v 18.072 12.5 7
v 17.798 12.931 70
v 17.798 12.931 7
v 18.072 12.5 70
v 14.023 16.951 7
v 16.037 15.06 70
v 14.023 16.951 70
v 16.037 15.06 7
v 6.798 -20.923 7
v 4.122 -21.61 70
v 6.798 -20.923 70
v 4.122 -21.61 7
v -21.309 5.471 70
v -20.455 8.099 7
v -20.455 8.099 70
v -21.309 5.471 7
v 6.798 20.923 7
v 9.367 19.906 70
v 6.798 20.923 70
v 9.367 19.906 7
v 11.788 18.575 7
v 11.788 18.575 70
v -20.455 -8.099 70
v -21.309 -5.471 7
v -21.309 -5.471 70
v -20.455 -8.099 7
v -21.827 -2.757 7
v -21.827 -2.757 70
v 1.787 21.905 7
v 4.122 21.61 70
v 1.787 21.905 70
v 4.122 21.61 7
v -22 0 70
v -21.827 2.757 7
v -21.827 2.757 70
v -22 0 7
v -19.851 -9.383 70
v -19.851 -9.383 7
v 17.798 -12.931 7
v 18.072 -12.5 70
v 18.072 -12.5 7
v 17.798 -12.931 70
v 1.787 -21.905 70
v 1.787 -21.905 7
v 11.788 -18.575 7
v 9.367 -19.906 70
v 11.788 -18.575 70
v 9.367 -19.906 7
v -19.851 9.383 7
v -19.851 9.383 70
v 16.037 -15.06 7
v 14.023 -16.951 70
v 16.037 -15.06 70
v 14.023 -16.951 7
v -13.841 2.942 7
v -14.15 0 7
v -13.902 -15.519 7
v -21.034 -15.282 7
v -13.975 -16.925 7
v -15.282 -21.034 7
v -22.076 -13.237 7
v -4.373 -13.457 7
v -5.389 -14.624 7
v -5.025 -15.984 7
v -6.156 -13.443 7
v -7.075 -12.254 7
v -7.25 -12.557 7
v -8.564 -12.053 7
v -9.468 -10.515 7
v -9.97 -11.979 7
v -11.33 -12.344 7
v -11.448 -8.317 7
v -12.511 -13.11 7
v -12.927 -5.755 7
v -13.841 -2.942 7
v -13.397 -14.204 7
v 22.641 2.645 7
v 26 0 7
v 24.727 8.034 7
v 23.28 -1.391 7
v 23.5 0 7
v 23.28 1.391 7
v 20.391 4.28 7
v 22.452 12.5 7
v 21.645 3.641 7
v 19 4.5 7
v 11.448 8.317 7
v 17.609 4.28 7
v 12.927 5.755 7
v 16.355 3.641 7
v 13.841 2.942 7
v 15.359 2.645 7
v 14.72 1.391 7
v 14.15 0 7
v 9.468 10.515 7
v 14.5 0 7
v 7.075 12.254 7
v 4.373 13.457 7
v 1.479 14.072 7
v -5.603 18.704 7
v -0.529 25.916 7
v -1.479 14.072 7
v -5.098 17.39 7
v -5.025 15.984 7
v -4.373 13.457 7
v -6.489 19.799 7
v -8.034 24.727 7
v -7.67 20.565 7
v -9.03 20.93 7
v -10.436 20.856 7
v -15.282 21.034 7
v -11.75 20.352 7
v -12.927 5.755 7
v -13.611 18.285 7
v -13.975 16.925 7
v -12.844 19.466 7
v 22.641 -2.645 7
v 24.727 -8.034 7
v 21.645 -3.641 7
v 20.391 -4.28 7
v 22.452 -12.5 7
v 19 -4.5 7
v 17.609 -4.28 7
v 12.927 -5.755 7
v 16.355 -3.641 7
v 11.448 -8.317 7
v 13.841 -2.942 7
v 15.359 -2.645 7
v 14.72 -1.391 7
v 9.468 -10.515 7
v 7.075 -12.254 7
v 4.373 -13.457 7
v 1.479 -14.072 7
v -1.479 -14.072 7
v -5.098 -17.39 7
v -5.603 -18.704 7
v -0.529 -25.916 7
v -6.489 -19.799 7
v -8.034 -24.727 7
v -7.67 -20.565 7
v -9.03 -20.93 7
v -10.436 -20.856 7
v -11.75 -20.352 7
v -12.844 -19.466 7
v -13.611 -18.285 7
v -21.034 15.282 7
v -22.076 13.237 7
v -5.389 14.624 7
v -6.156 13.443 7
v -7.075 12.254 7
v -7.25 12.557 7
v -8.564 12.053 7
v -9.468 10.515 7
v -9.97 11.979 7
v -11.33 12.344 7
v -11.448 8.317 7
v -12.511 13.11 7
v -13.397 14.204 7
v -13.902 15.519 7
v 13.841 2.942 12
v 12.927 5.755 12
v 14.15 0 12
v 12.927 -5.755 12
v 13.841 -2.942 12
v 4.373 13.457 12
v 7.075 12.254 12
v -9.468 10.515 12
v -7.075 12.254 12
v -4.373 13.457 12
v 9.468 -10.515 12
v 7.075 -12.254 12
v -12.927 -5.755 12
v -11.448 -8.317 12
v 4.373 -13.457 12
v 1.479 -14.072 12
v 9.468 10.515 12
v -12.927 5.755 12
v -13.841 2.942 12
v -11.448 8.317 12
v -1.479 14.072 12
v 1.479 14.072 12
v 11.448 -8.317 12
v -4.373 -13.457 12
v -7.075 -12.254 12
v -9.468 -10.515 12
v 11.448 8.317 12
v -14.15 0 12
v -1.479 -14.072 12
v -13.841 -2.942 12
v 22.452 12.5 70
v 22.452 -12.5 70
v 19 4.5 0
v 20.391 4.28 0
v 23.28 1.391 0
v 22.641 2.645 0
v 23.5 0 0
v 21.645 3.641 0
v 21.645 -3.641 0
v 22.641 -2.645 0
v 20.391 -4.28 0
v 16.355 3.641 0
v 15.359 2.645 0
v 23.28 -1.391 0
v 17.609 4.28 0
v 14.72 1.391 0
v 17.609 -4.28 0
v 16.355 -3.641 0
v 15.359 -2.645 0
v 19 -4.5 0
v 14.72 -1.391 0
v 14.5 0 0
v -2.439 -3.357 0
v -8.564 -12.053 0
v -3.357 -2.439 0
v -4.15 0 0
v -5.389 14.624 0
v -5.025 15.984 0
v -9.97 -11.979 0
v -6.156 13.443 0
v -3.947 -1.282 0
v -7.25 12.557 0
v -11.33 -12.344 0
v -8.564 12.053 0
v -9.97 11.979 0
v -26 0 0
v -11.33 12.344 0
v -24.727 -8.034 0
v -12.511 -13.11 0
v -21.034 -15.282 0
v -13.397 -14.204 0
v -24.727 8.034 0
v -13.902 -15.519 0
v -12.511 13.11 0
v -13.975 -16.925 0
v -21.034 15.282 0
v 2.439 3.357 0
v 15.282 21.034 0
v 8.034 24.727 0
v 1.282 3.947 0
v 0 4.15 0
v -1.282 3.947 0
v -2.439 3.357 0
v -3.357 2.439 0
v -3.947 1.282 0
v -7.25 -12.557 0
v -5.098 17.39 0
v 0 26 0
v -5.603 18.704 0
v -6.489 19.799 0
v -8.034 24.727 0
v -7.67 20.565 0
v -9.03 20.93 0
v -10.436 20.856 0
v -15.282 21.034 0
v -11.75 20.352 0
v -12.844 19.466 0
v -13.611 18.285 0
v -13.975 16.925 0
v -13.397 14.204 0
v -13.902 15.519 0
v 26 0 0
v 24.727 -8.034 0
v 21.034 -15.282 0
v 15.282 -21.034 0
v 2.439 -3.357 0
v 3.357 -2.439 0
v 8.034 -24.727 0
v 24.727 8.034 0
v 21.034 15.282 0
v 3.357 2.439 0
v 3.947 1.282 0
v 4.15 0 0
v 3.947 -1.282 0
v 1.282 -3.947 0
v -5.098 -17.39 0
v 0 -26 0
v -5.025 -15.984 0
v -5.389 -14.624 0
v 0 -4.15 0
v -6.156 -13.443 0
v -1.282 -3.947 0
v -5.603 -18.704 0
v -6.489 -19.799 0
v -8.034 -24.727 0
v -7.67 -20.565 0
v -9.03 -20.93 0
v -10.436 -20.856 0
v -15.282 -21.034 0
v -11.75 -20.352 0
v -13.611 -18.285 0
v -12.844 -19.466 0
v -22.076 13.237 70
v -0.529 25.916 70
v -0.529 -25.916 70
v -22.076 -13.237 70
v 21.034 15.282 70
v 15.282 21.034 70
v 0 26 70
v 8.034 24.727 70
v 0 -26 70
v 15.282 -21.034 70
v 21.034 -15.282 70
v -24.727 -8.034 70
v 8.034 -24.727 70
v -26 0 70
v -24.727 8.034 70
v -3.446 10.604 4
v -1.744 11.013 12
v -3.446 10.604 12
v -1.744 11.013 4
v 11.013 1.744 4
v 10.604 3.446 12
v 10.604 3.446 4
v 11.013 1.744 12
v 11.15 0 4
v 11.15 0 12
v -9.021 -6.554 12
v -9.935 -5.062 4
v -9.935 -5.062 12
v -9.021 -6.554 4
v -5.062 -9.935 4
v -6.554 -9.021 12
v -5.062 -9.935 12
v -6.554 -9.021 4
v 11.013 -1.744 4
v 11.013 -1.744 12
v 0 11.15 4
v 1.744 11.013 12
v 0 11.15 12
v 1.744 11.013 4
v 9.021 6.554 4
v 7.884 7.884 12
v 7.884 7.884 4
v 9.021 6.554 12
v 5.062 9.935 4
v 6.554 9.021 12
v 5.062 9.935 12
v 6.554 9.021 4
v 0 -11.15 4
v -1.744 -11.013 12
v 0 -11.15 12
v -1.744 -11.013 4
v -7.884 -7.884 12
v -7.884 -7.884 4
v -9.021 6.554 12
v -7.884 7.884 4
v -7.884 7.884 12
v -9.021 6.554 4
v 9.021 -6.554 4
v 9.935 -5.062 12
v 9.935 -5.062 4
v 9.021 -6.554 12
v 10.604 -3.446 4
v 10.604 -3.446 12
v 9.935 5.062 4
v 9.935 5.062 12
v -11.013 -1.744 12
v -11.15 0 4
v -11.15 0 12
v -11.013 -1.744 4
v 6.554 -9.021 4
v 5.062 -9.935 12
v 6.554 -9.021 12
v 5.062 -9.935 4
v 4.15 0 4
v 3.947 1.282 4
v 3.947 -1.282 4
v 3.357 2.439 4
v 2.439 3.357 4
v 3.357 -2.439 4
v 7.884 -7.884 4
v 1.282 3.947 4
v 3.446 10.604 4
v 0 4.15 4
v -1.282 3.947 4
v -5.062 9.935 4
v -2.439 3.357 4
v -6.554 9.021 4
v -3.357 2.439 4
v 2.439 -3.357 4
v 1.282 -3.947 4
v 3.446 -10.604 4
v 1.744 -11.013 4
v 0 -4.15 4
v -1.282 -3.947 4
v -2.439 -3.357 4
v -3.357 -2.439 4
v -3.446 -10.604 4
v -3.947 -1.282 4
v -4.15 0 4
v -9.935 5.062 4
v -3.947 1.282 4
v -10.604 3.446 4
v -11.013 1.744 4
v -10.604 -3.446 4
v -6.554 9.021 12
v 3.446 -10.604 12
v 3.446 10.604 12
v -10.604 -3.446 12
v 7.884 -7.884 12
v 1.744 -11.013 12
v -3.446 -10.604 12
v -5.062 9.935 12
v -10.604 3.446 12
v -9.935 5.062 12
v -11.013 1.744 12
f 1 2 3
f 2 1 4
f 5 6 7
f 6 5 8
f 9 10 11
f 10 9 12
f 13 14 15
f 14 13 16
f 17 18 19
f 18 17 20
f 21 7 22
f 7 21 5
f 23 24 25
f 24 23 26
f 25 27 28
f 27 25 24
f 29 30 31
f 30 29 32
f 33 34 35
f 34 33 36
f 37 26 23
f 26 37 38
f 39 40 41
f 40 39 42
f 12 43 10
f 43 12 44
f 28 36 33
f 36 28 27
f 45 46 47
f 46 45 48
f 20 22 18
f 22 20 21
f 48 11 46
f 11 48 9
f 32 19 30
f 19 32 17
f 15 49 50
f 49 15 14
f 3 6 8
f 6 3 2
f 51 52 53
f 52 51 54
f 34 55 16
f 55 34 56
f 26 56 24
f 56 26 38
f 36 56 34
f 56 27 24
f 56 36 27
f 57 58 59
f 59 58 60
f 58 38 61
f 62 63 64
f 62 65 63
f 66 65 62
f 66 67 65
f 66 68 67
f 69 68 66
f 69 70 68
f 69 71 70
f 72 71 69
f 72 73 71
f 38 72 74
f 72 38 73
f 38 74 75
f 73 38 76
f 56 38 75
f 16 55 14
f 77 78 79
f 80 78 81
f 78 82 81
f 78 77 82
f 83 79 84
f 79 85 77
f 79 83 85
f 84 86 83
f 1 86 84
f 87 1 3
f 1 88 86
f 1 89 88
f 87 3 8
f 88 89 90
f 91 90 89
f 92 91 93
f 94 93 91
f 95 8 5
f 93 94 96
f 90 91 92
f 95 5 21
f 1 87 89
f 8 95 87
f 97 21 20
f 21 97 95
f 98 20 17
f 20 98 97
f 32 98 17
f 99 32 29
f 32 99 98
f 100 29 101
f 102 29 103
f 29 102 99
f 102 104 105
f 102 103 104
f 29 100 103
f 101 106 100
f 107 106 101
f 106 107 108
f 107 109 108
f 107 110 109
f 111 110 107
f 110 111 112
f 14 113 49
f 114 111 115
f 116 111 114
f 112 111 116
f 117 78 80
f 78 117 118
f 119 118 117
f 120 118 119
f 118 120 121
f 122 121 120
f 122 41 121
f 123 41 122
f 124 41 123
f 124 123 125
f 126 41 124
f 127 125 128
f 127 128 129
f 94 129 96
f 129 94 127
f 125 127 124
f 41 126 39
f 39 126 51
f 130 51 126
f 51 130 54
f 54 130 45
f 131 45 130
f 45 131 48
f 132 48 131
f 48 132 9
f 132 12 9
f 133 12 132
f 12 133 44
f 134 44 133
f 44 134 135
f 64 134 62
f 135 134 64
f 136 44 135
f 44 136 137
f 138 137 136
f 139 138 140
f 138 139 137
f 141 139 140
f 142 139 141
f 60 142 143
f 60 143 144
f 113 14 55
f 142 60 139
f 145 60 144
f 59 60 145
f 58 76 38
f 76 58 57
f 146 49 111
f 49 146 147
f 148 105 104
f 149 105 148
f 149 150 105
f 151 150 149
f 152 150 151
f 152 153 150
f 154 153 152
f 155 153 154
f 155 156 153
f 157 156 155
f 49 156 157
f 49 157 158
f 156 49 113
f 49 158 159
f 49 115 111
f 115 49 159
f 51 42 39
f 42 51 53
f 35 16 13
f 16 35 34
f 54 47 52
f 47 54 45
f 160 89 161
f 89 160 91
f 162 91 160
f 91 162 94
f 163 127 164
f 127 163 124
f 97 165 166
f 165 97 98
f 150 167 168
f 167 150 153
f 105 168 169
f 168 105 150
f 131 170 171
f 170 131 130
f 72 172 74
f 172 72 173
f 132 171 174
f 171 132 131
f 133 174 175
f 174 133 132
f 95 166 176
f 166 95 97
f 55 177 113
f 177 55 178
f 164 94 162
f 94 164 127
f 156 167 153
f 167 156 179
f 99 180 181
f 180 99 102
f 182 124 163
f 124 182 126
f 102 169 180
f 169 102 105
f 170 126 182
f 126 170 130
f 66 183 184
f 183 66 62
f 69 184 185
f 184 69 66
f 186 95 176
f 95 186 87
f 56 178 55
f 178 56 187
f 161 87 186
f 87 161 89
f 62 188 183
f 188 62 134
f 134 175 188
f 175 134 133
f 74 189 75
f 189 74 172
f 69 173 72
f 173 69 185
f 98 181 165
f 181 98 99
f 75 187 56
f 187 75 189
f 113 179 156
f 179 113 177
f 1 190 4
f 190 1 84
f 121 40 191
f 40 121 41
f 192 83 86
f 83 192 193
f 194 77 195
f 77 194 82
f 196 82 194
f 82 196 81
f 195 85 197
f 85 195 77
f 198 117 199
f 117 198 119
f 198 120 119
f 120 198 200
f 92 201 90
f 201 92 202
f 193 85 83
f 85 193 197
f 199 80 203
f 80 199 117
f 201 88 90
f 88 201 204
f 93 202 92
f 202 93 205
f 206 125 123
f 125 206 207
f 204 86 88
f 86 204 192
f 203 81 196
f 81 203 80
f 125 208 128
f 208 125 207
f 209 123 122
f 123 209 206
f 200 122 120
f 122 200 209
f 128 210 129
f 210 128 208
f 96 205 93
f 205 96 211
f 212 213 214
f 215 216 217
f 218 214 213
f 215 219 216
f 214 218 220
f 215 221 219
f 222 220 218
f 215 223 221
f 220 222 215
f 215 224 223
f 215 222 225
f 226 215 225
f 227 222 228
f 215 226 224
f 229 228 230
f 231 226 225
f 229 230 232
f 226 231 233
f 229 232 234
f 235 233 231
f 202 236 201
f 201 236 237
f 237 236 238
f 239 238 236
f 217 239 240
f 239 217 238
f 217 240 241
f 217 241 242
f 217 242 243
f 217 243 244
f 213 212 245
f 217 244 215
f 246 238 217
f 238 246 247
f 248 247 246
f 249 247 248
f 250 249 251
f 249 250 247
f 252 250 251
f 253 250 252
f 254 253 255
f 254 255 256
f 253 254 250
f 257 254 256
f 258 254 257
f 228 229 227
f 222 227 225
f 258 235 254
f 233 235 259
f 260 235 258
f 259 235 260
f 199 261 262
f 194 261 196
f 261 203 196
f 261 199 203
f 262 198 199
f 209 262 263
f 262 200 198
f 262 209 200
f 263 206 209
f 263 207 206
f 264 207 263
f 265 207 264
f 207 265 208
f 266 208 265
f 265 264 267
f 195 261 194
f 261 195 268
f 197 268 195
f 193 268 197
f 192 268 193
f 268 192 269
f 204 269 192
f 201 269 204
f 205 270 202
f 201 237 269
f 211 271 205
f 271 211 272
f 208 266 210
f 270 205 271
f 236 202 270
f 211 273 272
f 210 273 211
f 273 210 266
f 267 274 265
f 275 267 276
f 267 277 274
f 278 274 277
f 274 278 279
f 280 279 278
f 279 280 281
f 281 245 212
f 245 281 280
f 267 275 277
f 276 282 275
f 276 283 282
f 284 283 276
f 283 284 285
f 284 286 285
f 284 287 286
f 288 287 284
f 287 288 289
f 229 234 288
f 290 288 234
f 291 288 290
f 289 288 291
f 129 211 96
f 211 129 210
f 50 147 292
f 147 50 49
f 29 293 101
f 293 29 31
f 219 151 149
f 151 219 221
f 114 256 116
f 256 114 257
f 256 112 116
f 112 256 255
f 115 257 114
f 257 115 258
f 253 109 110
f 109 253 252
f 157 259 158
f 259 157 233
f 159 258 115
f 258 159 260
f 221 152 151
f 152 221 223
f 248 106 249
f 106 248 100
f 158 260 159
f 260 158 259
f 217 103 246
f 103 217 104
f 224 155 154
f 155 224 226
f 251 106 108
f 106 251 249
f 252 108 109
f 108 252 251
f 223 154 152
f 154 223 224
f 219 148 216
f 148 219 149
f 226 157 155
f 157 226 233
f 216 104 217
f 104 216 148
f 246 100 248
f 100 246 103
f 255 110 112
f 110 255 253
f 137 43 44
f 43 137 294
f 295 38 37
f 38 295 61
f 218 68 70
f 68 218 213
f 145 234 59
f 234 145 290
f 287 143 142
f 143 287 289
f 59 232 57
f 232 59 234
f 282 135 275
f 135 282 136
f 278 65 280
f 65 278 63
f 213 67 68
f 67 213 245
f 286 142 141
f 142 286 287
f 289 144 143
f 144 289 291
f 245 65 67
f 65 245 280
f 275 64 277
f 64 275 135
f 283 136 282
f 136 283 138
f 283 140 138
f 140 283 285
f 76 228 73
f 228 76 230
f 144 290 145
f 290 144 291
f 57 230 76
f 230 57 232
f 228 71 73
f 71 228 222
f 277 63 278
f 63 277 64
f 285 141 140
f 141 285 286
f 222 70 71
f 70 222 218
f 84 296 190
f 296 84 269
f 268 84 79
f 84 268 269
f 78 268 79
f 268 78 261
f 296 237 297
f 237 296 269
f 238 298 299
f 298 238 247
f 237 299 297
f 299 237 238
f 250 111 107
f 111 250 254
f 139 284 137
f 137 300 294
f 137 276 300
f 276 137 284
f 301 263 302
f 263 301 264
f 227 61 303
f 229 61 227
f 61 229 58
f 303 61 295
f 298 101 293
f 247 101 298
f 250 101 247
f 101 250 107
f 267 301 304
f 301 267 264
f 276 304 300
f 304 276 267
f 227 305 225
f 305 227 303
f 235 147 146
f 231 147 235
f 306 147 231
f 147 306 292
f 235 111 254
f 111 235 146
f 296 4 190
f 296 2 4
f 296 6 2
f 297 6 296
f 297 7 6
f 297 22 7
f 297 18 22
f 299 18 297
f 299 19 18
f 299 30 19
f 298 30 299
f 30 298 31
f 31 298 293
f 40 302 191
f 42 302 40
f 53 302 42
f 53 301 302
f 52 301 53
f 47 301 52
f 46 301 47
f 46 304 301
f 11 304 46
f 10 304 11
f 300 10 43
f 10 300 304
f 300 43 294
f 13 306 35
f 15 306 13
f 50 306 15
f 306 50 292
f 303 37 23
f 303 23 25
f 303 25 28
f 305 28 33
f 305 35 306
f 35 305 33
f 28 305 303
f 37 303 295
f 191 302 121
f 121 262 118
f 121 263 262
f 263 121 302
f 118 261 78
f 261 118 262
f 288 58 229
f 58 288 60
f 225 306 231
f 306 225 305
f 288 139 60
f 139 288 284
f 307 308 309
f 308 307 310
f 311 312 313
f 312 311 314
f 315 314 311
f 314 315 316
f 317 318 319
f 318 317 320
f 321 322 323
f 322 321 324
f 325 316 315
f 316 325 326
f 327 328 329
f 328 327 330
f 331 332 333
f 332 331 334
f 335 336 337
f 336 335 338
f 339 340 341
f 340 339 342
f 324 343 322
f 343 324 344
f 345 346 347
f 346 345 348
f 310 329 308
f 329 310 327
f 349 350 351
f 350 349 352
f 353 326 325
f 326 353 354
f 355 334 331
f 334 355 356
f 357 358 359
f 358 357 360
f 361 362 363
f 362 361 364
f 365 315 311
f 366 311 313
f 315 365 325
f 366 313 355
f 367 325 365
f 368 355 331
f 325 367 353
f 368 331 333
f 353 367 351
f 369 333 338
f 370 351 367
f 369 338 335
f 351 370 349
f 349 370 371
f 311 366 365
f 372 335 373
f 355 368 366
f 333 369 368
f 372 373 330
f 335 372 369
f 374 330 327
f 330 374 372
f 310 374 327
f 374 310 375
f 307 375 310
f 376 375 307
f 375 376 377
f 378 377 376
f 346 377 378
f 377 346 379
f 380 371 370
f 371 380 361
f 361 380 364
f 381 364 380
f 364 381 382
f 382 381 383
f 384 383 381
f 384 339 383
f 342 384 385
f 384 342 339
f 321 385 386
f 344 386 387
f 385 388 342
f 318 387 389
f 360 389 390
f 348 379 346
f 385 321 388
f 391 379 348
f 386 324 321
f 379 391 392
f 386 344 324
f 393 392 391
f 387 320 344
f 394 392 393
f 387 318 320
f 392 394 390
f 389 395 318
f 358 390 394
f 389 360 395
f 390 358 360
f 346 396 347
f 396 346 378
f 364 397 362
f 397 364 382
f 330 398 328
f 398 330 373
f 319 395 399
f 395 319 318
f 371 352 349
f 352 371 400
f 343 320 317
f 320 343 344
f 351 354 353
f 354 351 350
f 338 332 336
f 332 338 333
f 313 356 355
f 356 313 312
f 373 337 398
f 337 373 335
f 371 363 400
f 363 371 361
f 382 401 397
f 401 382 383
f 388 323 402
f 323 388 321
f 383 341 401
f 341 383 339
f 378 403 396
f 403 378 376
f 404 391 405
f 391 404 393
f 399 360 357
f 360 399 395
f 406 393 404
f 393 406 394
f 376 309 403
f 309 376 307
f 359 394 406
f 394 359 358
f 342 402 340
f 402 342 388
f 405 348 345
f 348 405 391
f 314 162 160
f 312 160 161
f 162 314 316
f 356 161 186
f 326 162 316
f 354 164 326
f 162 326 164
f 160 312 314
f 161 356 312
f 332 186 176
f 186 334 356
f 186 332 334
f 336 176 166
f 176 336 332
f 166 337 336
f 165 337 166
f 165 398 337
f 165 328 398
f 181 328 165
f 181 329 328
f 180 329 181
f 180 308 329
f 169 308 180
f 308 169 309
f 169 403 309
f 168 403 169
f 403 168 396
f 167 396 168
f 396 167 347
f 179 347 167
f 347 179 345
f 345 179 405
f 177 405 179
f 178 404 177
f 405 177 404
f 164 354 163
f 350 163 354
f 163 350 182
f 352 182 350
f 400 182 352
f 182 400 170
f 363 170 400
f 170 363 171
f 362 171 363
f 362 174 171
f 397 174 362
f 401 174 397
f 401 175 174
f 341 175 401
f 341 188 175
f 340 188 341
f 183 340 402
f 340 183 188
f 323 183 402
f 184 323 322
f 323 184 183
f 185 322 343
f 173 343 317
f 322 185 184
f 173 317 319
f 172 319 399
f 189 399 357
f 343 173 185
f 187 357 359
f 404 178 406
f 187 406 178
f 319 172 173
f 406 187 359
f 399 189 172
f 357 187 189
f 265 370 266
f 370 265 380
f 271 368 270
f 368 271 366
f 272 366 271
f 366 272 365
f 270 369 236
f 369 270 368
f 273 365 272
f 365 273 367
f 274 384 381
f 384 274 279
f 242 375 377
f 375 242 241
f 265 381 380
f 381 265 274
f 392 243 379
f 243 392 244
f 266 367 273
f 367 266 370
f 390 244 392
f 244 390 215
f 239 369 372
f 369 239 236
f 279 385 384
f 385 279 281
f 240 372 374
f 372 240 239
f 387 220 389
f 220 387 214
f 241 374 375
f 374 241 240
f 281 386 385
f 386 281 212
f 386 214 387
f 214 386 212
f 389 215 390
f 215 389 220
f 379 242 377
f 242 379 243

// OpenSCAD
// file: dronePlates.scad
/**
 * dronePlates.scad
 * Plate library
 *
 * GNU GPL V3
 * @author: Victor Potenciano
 */

m3Rad = 3.4/2;
cornerR = 4;

/**
 *
 */
module helperDisk(diameter) {
	cylinder(r = diameter/2, h = 0.6, $fn=20);
}

/**
 *
 */
module roundedRect(size, radius) {
	x = size[0];
	y = size[1];
	z = size[2];

	linear_extrude(height=z)
	hull() {
	// place 4 circles in the corners, with the given radius
	translate([(-x/2)+(radius/2), (-y/2)+(radius/2), 0]){ circle(r=radius); }
	translate([(x/2)-(radius/2), (-y/2)+(radius/2), 0]){ circle(r=radius); }
	translate([(-x/2)+(radius/2), (y/2)-(radius/2), 0]){ circle(r=radius); }
	translate([(x/2)-(radius/2), (y/2)-(radius/2), 0]){ circle(r=radius); }
	}
}

/**
 * rounded rectangle triangle with corner at origin
 */
module roundedTriangle(size, radius) {
	x = size[0];
	y = size[1];
	z = size[2];

	linear_extrude(height=z)
	hull() {
	translate([radius, radius, 0]){ circle(r=radius); }
	translate([x-radius, radius, 0]){ circle(r=radius); }
	translate([radius, y-radius, 0]){ circle(r=radius); }
	}
}

/**
 *
 */
module roundRectPlate(w, l, plateThick=3) {
	difference(){
		roundedRect([l+m3Rad*1.75,w+m3Rad*1.75,plateThick], cornerR);
		translate([l/2, w/2, -0.5]) { cylinder(h = plateThick+1, r = m3Rad, $fn=30); }
		translate([-l/2, w/2, -0.5]) { cylinder(h = plateThick+1, r = m3Rad, $fn=30); }
		translate([l/2, -w/2, -0.5]) { cylinder(h = plateThick+1, r = m3Rad, $fn=30); }
		translate([-l/2, -w/2, -0.5]) { cylinder(h = plateThick+1, r = m3Rad, $fn=30); }
	}
}

/**
 *
 */
module crossSquarePlate(l, thick=3) {
	inDist = cornerR*2+4;
	trianL = sqrt((l*l)/2)-inDist;
	centerR = 4;

	difference(){
		roundRectPlate(l, l, thick);
		translate([0, centerR, -0.5]) { 
			rotate([0,0,45]){ roundedTriangle([trianL,trianL,thick+1], cornerR-2); }
		}
		translate([0, -centerR, -0.5]) { 
			rotate([0,0,225]){ roundedTriangle([trianL,trianL,thick+1], cornerR-2); }
		}
		translate([-centerR, 0, -0.5]) { 
			rotate([0,0,135]){ roundedTriangle([trianL,trianL,thick+1], cornerR-2); }
		}
		translate([centerR, 0, -0.5]) { 
			rotate([0,0,-45]){ roundedTriangle([trianL,trianL,thick+1], cornerR-2); }
		}
	}
}

/**
 *
 */
module hShapePlate(w, l, thick=4) {
	inDist = cornerR*2+1;

	difference(){
		roundRectPlate(w, l, thick);
		translate([0, w/4, -0.5]) { roundedRect([l-inDist,w/2-inDist,thick+1], cornerR-2); }
		translate([0, -w/4, -0.5]) { roundedRect([l-inDist,w/2-inDist,thick+1], cornerR-2); }
	}
}

/**
 *
 */
module motorCircleMount(inDia, outDia, thick=3, extraH=false, d1=19, d2=16, holeR=m3Rad ) {
	difference(){
		cylinder(h = thick, r = outDia/2, $fn=30);
		motorCircleMountHoles(inDia, outDia, thick, extraH, d1=d1, d2=d2, holeR=holeR);
	}
}

/**
 *
 */
module motorCircleMountHoles(inDia, outDia, thick=3, extraH=false, d1=19, d2=16, d3=25, holeR=m3Rad) {
	translate([0, 0, -0.5]) { cylinder(h = thick+1, r = inDia/2, $fn=30); }

	for(i=[0:3]) {
		rotate([0,0,90*i]){
		translate([d1/2, 0, -0.5]) cylinder(h = thick+1, r = holeR, $fn=20);
		translate([d2/2, 0, -0.5]) cylinder(h = thick+1, r = holeR, $fn=20);
		translate([d2/2, -holeR, -0.5]) cube(size = [(d1-d2)/2,holeR*2,thick+1]);
		}
	}
	
	if(extraH==true){	
		for(i=[-1,1]) translate([i*d3/2, 0, -0.5]) { cylinder(h = thick+1, r = holeR, $fn=30); }
	}
}

/**
 *
 */
module motorRectMount(w, l, inDia, thick=3) {
	d1=19;
	d2=16;

	difference(){
		roundRectPlate(w, l, thick);
		translate([0, 0, -0.5]) { cylinder(h = thick+1, r = inDia/2, $fn=30); }
		translate([0, d1/2, -0.5]) { cylinder(h = thick+1, r = m3Rad, $fn=30); }
		translate([0, -d1/2, -0.5]) { cylinder(h = thick+1, r = m3Rad, $fn=30); }
		translate([d2/2, 0, -0.5]) { cylinder(h = thick+1, r = m3Rad, $fn=30); }
		translate([-d2/2, 0, -0.5]) { cylinder(h = thick+1, r = m3Rad, $fn=30); }
	}
}

/**
 *
 */
module tube(inDia, outDia, height) {
	difference(){
		cylinder(h = height, r = outDia/2, $fn=50);
		translate([0, 0, -0.5]) { cylinder(h = height+1, r = inDia/2, $fn=30); }
	}
}

/**
 *
 */
module squareTube(inDia, outDia, height) {
	translate([0,0,height/2]){
	difference(){
		cube(size = [outDia,outDia,height], center = true);
		cube(size = [inDia,inDia,height+1], center = true);
	}
	}
}

/**
 *
 */
module djiFlamewheelHoles(height) {
	a = 23;
	b = 16;
	c = 19.5;
	
	translate([a/2, c/2, 0]) { cylinder(h = height, r = m3Rad, $fn=30); }
	translate([-a/2, c/2, 0]) { cylinder(h = height, r = m3Rad, $fn=30); }
	translate([b/2, -c/2, 0]) { cylinder(h = height, r = m3Rad, $fn=30); }
	translate([-b/2, -c/2, 0]) { cylinder(h = height, r = m3Rad, $fn=30); }
}

/**
 *
 */
module djiFlamewheelHolesBotton(height) {
	a1 = 21;
	c = 19.5;
	
	translate([a1/2, c/2, 0]) { cylinder(h = height, r = m3Rad, $fn=30); }
	translate([-a1/2, c/2, 0]) { cylinder(h = height, r = m3Rad, $fn=30); }
}

/**
 *
 */
module propeller(size){
union(){
difference(){
	cylinder(h = 3, r = size/2, center=true, $fn=30);
	cylinder(h = 3.1, r = size/2-2, center=true, $fn=30); 
}
for( i = [-1,1] ){
rotate([0,0,45*i]){ cube(size = [size,4,1], center = true); }
}
}
}

/**
 *
 */
module slot(length, height, rad){
for(i=[-1,1]) translate([i*length/2,0,0]) cylinder(h = height, r = rad, $fn=30);
translate([0,0,height/2]) cube(size = [length,rad*2,height], center = true);
}

 

////////////////////////
// Examples:
////////////////////////

motorCircleMount(8, 25, 3.5);

//roundedRect([50,50,3], 4);

//hShapePlate(79, 25);

//rotate([0,0,45]){roundedTriangle([40,40,3], 4);}

//crossSquarePlate(45, 4);

/*
union(){
motorRectMount(21, 18, 8, 4);
translate([9, 10.5, 0]) {tube(m3Rad*2, 6.5, 6);}
}
*/

/*
difference(){
union(){
hShapePlate(50, 30, 3.5);
translate([-4,-25,0]){cube(size = [8,50,3.5]);}
rotate([0, 0, 45]) {motorCircleMount(8, 35, 3.5);}
}
cylinder(h = 10, r = 4, $fn=100, center=true);
}
*/

//rotate([90,0,0]){ tube(5,10,20); }
//translate([20,0,0]){ squareTube(5, 10, 20); }
// main file
/**
 * Spool holder
 */

use <dronePlates.scad>;

diam = 52;
height = 70;
bearingDia = 22.3;

difference(){

cylinder(r=diam/2, h=height, $fn=20);

translate([0,0,7]) tube(bearingDia+6, diam-8, height);
translate([0,0,4]) cylinder(r=bearingDia/2, h=height, $fn=40);
translate([0,0,12]) cylinder(r=29/2, h=height, $fn=20);
cylinder(r=8.3/2, h=70, $fn=20);

for(i=[0:2]){
rotate([0,0,i*120]) translate([diam/2-8,-25/2,7]) cube(size=[25,25,70]);
rotate([0,0,i*120]) translate([diam/2-7,0,0])  cylinder(r=4.5, h=height, $fn=20);
}

}//diff
